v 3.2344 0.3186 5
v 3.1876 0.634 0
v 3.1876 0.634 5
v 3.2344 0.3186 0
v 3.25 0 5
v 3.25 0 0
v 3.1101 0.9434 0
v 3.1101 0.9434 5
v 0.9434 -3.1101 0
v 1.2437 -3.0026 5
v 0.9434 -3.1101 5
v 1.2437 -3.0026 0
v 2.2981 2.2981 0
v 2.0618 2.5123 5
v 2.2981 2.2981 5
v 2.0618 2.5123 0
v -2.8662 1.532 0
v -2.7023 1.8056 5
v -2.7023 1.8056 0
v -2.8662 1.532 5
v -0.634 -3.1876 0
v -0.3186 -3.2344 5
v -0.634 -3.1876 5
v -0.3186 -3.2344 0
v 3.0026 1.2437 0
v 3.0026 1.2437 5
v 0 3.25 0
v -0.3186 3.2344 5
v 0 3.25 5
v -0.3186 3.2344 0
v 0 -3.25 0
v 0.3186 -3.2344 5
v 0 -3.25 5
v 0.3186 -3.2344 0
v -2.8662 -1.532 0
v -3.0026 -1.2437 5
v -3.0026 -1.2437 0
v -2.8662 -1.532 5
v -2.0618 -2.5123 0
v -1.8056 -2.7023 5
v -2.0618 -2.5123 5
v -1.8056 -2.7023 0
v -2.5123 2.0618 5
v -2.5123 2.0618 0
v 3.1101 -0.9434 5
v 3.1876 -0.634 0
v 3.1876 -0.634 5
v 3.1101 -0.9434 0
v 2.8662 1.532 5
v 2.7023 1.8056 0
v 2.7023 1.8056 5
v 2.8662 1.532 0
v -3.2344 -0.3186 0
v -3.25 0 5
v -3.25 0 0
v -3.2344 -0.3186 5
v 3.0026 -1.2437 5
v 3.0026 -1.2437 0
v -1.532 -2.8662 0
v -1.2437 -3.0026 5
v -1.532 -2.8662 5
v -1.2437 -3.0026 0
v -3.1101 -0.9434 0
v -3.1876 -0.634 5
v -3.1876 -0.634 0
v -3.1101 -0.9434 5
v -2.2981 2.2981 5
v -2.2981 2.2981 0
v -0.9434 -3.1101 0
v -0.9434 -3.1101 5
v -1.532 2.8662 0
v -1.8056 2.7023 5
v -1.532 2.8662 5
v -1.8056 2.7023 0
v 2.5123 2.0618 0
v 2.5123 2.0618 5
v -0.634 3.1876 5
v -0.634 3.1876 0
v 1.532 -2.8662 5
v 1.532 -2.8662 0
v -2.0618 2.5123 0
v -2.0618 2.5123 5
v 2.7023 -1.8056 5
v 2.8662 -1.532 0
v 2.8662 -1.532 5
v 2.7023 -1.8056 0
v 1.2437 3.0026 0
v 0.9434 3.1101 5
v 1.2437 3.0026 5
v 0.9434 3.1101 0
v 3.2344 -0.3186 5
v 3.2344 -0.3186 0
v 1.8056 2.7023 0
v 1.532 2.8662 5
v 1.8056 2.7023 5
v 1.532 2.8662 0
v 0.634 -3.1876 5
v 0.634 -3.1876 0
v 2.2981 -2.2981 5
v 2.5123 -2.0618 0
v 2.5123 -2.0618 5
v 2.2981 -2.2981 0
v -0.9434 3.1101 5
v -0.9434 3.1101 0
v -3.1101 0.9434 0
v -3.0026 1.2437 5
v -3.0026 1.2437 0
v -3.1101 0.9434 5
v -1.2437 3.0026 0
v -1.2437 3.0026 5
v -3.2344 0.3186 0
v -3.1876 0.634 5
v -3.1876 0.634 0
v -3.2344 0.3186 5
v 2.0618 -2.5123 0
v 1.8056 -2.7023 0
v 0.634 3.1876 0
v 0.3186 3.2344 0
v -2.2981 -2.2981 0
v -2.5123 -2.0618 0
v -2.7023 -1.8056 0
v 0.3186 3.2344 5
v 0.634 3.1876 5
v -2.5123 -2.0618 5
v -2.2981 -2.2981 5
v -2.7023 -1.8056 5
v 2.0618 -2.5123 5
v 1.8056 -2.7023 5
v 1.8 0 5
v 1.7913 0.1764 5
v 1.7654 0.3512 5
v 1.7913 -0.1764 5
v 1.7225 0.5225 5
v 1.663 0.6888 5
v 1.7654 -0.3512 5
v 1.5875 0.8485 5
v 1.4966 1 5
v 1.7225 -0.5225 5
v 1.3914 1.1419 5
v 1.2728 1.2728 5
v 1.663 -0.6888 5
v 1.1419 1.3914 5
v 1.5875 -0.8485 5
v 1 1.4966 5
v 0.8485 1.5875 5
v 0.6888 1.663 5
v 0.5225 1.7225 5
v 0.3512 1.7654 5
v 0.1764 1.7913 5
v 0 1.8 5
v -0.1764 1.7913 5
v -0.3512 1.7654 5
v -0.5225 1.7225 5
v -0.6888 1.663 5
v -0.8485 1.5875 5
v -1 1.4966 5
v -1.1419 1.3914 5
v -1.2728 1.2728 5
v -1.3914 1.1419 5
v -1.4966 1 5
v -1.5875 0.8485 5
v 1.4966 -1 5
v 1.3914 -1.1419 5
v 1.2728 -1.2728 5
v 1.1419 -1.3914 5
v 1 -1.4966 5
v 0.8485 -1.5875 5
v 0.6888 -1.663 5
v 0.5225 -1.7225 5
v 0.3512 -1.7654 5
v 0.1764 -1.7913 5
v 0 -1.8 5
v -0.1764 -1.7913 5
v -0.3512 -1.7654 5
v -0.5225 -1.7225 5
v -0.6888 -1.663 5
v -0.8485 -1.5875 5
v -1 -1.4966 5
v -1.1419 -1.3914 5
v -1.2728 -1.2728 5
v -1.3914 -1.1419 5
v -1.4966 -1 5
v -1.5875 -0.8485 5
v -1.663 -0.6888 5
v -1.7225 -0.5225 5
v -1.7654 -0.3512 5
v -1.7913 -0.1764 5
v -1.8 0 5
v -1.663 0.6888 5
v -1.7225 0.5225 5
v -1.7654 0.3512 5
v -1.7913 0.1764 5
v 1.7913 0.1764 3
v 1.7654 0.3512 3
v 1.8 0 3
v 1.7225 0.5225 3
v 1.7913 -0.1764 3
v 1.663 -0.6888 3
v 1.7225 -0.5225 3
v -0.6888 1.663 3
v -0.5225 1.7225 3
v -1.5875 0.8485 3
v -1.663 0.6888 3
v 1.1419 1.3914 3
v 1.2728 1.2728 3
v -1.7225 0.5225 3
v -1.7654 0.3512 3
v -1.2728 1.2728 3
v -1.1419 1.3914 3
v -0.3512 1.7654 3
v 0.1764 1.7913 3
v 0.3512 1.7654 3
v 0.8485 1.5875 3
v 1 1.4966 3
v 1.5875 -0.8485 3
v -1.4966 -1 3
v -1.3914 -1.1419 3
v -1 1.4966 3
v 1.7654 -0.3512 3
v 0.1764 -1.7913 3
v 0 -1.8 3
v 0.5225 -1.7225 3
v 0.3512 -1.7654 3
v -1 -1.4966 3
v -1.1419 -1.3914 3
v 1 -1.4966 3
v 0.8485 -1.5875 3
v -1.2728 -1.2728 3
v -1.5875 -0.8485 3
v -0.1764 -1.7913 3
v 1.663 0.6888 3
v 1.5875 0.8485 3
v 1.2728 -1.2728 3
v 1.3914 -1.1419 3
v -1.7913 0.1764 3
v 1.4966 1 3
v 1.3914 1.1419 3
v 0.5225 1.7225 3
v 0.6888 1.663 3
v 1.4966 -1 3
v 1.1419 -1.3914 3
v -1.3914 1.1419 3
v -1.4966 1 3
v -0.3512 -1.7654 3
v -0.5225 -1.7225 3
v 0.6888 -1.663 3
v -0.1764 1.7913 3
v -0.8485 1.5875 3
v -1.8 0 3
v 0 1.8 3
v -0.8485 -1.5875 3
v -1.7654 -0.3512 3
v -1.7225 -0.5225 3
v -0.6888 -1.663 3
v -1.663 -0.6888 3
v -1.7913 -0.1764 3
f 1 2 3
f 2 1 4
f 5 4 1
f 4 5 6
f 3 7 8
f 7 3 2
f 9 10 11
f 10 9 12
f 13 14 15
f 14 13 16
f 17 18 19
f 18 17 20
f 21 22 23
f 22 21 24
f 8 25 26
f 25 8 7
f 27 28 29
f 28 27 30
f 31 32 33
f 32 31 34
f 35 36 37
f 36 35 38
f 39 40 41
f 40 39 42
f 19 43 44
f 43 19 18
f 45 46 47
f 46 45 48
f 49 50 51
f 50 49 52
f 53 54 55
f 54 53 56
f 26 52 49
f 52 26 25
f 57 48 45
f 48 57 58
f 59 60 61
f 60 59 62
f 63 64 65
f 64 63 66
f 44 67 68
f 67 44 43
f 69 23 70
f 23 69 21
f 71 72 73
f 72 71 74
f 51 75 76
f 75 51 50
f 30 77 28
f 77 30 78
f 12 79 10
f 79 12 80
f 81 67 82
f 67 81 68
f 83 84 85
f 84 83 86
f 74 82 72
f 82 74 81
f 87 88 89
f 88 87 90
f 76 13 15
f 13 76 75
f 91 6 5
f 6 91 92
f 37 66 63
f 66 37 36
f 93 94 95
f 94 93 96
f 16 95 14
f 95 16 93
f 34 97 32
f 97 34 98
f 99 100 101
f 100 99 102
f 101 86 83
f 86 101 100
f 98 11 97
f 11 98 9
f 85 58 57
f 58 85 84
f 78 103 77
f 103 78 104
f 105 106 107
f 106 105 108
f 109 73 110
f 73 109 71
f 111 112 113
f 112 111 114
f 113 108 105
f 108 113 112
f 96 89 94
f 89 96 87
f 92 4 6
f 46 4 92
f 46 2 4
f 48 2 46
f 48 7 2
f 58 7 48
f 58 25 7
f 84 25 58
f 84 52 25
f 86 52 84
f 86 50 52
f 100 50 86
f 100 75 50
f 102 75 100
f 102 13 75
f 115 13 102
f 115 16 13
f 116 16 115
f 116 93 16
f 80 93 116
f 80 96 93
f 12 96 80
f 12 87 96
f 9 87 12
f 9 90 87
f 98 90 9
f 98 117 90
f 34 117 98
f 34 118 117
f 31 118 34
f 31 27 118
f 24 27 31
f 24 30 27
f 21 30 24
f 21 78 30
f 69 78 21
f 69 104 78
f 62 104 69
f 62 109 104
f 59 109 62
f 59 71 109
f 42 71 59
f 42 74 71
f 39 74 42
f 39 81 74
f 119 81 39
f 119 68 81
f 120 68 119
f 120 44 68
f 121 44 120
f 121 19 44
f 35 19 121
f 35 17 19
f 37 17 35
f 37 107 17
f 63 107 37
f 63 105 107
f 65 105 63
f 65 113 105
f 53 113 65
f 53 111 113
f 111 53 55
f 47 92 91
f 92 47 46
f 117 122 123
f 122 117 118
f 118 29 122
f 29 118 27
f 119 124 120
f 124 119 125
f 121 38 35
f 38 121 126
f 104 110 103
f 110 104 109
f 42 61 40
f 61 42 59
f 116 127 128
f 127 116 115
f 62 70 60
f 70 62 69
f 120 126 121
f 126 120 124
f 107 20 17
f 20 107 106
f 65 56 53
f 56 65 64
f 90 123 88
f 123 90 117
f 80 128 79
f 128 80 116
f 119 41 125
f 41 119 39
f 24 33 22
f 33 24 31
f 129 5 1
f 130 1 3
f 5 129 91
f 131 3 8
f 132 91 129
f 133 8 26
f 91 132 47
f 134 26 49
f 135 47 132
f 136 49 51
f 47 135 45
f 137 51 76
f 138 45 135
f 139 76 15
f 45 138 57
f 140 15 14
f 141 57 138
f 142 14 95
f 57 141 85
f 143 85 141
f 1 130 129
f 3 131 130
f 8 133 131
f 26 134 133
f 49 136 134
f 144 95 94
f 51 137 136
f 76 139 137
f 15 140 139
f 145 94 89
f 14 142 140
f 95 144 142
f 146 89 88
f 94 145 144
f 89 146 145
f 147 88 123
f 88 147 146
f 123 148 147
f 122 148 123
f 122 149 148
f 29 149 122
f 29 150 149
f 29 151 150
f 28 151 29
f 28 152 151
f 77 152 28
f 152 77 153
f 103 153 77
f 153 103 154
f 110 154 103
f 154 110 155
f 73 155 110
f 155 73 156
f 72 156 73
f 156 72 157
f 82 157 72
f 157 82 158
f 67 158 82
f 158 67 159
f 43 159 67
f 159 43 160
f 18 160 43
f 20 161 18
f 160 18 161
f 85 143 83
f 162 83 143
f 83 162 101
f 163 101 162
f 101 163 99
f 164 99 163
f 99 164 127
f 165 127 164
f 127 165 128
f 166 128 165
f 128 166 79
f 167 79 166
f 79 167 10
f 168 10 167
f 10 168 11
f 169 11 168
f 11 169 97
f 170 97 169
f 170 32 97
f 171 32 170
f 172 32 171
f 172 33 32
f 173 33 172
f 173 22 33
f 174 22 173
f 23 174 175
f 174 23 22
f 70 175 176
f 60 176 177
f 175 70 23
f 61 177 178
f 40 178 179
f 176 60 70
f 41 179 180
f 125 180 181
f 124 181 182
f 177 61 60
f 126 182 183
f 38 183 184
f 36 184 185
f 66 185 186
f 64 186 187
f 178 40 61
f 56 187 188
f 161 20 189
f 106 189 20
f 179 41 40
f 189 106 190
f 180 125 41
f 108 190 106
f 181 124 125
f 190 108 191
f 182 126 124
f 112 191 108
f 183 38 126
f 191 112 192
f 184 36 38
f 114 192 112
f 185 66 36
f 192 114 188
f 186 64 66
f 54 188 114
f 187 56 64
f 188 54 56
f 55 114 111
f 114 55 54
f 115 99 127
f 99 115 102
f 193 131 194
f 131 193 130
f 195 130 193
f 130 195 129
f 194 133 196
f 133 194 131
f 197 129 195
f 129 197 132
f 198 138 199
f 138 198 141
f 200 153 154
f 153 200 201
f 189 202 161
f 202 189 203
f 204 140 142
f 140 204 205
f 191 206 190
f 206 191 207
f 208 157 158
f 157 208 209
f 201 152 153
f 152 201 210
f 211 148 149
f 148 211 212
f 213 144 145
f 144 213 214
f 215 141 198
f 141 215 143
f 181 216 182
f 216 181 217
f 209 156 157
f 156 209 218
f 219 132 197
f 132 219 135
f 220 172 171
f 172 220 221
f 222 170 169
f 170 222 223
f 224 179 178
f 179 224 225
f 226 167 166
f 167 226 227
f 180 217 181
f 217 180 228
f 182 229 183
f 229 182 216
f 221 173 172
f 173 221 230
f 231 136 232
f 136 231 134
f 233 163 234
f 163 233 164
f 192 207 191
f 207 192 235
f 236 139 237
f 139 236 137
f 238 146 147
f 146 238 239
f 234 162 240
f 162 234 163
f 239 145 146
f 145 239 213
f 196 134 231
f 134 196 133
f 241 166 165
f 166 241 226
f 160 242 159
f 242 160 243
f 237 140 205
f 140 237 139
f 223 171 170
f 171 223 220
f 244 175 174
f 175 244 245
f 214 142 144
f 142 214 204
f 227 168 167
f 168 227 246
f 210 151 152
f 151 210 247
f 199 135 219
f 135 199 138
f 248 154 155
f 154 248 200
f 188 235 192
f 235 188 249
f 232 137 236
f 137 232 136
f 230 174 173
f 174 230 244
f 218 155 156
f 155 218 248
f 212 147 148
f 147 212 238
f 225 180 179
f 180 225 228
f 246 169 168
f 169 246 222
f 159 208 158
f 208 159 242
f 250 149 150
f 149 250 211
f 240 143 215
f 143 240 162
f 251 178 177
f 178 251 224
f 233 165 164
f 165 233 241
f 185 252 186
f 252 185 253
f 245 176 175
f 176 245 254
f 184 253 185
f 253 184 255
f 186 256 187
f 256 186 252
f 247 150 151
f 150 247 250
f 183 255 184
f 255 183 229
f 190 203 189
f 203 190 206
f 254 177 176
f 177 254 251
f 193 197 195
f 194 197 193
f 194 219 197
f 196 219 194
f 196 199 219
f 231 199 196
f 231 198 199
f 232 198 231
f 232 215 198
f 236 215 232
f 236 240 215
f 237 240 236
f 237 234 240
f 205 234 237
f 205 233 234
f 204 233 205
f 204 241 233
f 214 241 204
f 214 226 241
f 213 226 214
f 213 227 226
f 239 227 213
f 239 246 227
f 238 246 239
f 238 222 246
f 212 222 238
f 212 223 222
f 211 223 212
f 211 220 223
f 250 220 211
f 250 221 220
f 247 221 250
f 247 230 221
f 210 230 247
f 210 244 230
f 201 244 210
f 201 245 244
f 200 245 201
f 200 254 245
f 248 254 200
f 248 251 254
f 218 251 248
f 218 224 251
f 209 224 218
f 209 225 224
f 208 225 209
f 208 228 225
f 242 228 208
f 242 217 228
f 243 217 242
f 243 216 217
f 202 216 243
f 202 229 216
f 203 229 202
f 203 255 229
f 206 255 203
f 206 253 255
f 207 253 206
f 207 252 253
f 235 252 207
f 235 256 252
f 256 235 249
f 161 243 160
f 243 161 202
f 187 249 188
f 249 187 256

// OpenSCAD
$fn = 64; // độ mịn bề mặt

difference() {
    // Khối trụ chính (cao 5mm, đường kính tùy bạn, ví dụ 10mm)
    cylinder(h = 5, d = 6.5, center = false);

    // Lỗ rỗng ở tâm (đường kính 3.6mm, sâu 2mm)
    translate([0, 0, 5 - 2])  // đặt lỗ bắt đầu từ mặt trên, ăn sâu xuống 2mm
        cylinder(h = 2, d = 3.6, center = false);
}
